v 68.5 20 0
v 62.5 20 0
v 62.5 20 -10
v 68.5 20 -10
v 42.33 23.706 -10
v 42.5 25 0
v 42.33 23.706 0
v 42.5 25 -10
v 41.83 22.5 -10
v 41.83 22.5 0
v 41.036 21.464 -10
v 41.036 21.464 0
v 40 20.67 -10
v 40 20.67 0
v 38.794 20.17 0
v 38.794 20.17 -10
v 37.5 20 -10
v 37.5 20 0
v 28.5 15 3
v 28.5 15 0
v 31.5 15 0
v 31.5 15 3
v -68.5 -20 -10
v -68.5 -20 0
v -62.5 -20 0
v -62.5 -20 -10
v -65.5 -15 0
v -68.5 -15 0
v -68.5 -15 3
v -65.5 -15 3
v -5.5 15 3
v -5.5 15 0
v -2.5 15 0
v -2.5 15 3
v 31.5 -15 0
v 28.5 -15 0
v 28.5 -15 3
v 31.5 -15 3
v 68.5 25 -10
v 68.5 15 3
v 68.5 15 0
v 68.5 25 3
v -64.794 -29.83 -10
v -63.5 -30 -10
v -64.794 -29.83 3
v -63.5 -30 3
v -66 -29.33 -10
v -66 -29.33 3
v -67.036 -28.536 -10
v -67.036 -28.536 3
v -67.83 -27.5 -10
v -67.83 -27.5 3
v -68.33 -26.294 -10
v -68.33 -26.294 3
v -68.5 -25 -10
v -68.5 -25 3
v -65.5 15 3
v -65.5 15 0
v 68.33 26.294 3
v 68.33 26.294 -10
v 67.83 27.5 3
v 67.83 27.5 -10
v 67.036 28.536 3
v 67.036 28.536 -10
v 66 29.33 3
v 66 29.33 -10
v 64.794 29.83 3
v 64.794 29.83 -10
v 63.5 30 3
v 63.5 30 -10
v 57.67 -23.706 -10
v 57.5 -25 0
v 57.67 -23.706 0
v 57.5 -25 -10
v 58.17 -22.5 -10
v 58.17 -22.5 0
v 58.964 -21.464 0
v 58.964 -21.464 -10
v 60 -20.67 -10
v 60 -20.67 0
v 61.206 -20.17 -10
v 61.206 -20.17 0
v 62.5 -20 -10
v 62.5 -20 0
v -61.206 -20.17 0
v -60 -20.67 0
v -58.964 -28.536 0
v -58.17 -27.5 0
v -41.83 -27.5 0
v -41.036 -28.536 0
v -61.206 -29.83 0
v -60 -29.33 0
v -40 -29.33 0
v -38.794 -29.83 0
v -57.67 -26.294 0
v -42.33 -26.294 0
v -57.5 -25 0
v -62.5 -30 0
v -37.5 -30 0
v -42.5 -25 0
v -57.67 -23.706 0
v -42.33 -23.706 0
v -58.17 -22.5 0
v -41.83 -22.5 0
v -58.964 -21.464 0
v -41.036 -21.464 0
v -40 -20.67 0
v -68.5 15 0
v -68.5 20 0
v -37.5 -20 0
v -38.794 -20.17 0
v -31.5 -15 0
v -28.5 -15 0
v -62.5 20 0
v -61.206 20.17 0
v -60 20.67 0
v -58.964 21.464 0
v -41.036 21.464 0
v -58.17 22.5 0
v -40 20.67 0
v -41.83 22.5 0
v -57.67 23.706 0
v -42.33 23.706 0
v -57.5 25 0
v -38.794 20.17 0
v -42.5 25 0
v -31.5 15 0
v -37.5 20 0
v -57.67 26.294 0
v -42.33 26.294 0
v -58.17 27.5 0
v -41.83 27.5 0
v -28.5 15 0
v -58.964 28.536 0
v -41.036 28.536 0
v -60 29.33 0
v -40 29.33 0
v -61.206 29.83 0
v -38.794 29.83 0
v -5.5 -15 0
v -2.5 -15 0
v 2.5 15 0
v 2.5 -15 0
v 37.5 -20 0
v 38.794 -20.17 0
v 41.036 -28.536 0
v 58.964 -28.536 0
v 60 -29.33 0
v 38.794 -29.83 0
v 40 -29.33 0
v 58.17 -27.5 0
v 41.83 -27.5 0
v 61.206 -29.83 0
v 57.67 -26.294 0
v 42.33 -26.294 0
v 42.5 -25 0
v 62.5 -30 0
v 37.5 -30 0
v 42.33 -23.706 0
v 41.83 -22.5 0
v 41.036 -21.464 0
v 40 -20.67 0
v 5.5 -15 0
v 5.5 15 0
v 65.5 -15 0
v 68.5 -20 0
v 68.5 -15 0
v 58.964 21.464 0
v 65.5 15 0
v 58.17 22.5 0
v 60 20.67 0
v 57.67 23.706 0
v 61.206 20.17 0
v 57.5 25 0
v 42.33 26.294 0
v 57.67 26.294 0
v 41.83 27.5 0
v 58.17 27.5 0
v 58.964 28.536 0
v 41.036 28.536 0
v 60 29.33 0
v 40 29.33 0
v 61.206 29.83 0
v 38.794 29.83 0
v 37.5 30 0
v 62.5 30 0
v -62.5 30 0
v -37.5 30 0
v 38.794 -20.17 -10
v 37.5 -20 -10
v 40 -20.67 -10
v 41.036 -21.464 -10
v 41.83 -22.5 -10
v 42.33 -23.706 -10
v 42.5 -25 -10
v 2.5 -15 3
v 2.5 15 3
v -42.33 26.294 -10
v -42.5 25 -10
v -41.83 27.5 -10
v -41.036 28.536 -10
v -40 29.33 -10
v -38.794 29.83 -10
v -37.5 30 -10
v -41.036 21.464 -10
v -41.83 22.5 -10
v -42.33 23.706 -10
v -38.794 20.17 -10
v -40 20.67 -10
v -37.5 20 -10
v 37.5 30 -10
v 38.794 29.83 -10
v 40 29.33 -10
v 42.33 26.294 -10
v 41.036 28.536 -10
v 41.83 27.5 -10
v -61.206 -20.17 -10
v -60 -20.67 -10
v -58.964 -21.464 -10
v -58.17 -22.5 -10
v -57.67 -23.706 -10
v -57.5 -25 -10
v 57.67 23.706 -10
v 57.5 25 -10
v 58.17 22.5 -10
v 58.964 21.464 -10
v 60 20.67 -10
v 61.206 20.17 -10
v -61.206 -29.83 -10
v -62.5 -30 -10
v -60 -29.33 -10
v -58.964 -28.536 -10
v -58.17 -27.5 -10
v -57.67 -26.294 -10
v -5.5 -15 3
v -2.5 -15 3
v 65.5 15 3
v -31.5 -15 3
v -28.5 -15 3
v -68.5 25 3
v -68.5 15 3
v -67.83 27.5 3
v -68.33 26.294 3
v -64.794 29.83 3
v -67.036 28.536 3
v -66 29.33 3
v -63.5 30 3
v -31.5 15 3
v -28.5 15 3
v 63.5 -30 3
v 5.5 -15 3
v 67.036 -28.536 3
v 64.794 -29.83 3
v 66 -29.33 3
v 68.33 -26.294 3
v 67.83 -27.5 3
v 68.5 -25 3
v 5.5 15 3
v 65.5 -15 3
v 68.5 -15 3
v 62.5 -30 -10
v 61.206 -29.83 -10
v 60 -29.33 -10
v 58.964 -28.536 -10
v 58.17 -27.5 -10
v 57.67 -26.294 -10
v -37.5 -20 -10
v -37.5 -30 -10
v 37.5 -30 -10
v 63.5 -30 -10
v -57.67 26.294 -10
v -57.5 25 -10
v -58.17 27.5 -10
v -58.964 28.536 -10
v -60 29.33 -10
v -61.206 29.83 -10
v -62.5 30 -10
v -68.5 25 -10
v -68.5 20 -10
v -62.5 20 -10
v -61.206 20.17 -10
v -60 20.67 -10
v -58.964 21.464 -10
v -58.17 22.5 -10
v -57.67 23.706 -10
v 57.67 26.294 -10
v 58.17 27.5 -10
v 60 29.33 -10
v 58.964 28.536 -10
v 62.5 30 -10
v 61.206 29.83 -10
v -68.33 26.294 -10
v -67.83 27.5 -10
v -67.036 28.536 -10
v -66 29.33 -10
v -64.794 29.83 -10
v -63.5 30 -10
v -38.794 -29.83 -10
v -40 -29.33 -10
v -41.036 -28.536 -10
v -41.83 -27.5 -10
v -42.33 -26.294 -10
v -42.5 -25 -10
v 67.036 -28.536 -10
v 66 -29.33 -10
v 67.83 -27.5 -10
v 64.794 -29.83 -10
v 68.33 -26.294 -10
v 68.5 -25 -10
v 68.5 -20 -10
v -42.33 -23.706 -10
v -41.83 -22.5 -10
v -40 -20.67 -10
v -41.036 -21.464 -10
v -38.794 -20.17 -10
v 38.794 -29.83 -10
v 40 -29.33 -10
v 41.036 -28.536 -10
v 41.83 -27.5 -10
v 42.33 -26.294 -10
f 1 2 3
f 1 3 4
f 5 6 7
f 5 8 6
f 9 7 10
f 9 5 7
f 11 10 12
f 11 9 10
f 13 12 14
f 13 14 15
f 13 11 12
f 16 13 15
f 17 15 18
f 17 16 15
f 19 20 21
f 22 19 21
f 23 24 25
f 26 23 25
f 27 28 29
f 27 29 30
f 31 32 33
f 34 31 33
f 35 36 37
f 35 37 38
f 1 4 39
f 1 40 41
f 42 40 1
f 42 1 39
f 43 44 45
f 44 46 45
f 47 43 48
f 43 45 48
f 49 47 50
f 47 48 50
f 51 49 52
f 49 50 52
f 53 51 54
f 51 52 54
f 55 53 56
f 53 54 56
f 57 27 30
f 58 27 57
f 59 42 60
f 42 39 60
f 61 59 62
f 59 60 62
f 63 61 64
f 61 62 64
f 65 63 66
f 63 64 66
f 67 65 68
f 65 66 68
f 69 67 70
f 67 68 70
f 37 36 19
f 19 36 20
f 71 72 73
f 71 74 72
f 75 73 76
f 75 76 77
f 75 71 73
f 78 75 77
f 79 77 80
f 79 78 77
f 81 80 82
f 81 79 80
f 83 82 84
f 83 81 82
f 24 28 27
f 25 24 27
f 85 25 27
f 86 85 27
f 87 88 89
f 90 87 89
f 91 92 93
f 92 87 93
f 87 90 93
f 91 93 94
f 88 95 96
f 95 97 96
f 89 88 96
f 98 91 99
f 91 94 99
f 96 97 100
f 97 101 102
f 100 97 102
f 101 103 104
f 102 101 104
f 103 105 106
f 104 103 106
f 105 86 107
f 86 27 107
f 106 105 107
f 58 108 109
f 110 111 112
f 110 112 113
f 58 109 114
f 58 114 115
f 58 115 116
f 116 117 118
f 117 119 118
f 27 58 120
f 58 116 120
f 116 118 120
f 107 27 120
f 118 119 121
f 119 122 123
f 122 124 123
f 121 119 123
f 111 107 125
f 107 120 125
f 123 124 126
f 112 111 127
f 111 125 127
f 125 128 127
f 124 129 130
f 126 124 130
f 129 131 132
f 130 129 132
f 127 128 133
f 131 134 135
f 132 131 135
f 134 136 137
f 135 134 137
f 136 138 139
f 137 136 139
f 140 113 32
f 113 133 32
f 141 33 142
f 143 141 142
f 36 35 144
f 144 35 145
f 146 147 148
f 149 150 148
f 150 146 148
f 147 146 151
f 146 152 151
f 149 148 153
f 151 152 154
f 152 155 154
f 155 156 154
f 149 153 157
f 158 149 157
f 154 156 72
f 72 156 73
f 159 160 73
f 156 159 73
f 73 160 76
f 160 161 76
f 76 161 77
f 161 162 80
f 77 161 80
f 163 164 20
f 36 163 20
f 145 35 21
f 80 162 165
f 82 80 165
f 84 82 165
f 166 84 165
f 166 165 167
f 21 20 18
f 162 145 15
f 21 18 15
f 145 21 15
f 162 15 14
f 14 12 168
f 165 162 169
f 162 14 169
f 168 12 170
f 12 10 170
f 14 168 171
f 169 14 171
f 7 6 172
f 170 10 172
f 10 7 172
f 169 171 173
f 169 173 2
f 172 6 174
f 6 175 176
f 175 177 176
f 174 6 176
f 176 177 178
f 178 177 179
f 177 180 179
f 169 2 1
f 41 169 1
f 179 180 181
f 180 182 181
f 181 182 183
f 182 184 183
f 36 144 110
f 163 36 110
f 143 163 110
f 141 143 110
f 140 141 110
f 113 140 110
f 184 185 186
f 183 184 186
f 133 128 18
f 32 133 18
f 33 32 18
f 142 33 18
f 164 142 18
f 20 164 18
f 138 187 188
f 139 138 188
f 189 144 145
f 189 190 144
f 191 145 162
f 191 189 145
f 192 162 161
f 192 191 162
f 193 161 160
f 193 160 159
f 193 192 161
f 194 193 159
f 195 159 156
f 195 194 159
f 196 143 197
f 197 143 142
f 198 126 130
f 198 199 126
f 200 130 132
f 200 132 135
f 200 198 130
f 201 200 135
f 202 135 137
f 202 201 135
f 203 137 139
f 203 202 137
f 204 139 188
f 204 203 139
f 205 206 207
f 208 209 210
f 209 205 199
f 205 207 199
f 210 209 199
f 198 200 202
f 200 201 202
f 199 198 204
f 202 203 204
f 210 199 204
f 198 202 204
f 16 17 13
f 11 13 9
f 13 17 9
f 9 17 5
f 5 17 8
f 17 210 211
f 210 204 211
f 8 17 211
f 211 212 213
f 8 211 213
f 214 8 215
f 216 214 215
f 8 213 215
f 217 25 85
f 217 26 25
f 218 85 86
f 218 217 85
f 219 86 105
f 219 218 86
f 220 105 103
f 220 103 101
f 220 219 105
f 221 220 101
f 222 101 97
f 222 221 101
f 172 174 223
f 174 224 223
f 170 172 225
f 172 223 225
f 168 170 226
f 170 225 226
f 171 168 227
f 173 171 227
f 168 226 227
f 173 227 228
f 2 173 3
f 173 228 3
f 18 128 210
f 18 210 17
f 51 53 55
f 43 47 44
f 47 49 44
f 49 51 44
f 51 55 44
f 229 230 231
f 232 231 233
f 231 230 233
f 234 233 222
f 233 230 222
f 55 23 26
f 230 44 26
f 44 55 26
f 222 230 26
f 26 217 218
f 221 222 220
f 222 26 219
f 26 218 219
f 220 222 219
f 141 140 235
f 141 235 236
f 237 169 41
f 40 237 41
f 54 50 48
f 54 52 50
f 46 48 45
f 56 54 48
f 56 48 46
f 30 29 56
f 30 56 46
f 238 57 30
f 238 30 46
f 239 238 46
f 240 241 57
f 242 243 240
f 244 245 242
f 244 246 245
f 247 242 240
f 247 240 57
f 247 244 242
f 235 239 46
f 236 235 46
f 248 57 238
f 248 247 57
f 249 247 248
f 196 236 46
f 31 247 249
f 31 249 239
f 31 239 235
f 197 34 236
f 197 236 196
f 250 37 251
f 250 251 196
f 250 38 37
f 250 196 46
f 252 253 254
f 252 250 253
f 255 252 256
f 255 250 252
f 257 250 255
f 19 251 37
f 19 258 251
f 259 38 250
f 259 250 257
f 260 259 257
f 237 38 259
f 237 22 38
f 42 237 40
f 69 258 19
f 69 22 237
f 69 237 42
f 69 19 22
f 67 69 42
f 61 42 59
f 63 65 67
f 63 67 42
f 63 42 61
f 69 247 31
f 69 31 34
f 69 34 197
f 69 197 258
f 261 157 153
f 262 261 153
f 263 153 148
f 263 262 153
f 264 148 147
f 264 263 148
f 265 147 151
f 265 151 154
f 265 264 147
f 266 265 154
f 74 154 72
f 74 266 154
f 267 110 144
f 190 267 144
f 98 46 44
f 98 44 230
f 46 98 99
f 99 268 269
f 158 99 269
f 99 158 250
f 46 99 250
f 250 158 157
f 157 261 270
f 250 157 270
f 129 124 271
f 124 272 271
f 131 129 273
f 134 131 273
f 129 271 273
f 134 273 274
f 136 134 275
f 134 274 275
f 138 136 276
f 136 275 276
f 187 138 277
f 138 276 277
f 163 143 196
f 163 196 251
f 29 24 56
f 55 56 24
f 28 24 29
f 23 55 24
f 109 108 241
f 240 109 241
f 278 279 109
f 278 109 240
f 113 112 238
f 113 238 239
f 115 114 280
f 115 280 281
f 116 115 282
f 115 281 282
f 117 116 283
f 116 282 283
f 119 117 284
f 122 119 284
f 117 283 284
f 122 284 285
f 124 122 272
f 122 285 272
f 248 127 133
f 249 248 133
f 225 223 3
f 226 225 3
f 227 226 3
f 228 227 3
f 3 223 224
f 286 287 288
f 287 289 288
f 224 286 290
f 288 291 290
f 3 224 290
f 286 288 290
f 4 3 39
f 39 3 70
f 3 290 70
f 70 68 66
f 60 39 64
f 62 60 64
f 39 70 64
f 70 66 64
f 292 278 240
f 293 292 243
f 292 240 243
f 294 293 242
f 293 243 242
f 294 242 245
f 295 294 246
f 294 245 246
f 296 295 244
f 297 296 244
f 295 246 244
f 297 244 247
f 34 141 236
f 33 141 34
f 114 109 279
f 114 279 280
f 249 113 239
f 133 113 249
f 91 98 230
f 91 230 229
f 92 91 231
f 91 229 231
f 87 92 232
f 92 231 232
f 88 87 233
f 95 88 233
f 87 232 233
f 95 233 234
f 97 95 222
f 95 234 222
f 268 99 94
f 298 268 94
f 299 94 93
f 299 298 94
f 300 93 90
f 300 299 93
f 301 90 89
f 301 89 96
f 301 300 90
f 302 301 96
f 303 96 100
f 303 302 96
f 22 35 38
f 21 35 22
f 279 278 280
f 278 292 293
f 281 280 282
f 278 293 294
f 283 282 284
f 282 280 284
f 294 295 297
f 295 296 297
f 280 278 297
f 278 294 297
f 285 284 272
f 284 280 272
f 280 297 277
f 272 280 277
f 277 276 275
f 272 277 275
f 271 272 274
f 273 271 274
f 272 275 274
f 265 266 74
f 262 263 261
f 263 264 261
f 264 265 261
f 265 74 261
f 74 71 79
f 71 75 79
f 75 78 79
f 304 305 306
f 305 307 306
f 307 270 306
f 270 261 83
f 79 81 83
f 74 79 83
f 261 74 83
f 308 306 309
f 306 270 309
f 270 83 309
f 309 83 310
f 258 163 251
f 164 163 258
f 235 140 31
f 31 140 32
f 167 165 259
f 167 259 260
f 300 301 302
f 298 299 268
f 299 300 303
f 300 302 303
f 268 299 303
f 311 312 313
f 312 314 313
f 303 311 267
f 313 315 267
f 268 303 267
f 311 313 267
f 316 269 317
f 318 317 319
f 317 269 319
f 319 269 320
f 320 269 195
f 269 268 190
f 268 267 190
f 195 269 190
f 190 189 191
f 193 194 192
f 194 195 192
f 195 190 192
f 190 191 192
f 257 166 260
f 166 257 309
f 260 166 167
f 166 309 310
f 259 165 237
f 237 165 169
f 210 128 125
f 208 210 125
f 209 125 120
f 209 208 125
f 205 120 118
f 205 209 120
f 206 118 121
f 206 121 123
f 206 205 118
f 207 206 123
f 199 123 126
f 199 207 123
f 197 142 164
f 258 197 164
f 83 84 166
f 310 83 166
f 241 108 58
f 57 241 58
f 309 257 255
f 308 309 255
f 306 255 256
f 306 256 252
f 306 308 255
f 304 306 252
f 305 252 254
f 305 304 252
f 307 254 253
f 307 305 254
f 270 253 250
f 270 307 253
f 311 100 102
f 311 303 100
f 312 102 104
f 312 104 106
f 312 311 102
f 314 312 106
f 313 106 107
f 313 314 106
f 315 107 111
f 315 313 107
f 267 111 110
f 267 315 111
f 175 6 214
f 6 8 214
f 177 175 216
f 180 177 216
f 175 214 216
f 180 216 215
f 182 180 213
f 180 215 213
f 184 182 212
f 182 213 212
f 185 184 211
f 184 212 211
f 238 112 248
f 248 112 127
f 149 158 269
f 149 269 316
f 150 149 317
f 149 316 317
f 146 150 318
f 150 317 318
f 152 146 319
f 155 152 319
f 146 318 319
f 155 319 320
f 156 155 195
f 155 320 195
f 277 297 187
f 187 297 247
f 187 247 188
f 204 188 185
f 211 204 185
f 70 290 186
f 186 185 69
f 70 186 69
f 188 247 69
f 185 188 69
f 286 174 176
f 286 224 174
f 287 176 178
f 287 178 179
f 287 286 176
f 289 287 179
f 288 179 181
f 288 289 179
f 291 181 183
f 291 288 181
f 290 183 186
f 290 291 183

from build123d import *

# Parameters (mm, degrees)
F0_W     = 150
F0_H     = 60
F1_DEPTH = 3
F2_W     = 3
F2_H     = 30
F3_DEPTH = 25
F4_W     = 6.5
F4_H     = 60
F5_DEPTH = 25
F6_W     = 85
F6_H     = 10
F6_W_2   = 11
F7_DEPTH = 10
F8_R     = 4.99999


# Not quite as in the source:
# - a fillet or chamfer is up to 0.001 mm smaller than in the source, because OpenCascade refuses the exact size


with BuildPart() as f1:
    # F0 (on Top) → F1 (new body)
    with BuildSketch(Plane.XY):
        Rectangle(F0_W, F0_H)
    extrude(amount=F1_DEPTH)

    # F2 (on Top) → F3 (cut)
    with BuildSketch(Plane.XY):
        with Locations((-4, 0)):
            Rectangle(F2_W, F2_H)
        with Locations((4, 0)):
            Rectangle(F2_W, F2_H)
        with Locations((67, 0)):
            Rectangle(F2_W, F2_H)
        with Locations((-67, 0)):
            Rectangle(F2_W, F2_H)
        with Locations((-30, 0)):
            Rectangle(F2_W, F2_H)
        with Locations((30, 0)):
            Rectangle(F2_W, F2_H)
    extrude(amount=F3_DEPTH, mode=Mode.SUBTRACT)

    # F4 (on Top) → F5 (cut)
    with BuildSketch(Plane.XY):
        with Locations((71.75, 0)):
            Rectangle(F4_W, F4_H)
        with Locations((-71.75, 0)):
            Rectangle(F4_W, F4_H)
    extrude(amount=F5_DEPTH, mode=Mode.SUBTRACT)

    # F6 (on Top) → F7 (join)
    with BuildSketch(Plane.XY):
        with Locations((0, 25)):
            Rectangle(F6_W, F6_H)
        with Locations((0, -25)):
            Rectangle(F6_W, F6_H)
        with Locations((63, 25)):
            Rectangle(F6_W_2, F6_H)
        with Locations((63, -25)):
            Rectangle(F6_W_2, F6_H)
        with Locations((-63, -25)):
            Rectangle(F6_W_2, F6_H)
        with Locations((-63, 25)):
            Rectangle(F6_W_2, F6_H)
    extrude(amount=-F7_DEPTH)

    # F8 (radius 5 in the source; OpenCascade refuses exactly that, so slightly less here)
    f8_edges = [f1.edges().sort_by_distance(p)[0] for p in [
        (-68.5, -30, -3.5),
        (-68.5, 30, -3.5),
        (68.5, 30, -3.5),
        (68.5, -30, -3.5),
        (42.5, 30, -5),
        (42.5, 20, -5),
        (42.5, -20, -5),
        (42.5, -30, -5),
        (57.5, 30, -5),
        (57.5, 20, -5),
        (57.5, -20, -5),
        (57.5, -30, -5),
        (-42.5, 30, -5),
        (-42.5, 20, -5),
        (-42.5, -20, -5),
        (-42.5, -30, -5),
        (-57.5, 30, -5),
        (-57.5, 20, -5),
        (-57.5, -20, -5),
        (-57.5, -30, -5),
    ]]
    fillet(f8_edges, radius=F8_R)


solid = f1.part
